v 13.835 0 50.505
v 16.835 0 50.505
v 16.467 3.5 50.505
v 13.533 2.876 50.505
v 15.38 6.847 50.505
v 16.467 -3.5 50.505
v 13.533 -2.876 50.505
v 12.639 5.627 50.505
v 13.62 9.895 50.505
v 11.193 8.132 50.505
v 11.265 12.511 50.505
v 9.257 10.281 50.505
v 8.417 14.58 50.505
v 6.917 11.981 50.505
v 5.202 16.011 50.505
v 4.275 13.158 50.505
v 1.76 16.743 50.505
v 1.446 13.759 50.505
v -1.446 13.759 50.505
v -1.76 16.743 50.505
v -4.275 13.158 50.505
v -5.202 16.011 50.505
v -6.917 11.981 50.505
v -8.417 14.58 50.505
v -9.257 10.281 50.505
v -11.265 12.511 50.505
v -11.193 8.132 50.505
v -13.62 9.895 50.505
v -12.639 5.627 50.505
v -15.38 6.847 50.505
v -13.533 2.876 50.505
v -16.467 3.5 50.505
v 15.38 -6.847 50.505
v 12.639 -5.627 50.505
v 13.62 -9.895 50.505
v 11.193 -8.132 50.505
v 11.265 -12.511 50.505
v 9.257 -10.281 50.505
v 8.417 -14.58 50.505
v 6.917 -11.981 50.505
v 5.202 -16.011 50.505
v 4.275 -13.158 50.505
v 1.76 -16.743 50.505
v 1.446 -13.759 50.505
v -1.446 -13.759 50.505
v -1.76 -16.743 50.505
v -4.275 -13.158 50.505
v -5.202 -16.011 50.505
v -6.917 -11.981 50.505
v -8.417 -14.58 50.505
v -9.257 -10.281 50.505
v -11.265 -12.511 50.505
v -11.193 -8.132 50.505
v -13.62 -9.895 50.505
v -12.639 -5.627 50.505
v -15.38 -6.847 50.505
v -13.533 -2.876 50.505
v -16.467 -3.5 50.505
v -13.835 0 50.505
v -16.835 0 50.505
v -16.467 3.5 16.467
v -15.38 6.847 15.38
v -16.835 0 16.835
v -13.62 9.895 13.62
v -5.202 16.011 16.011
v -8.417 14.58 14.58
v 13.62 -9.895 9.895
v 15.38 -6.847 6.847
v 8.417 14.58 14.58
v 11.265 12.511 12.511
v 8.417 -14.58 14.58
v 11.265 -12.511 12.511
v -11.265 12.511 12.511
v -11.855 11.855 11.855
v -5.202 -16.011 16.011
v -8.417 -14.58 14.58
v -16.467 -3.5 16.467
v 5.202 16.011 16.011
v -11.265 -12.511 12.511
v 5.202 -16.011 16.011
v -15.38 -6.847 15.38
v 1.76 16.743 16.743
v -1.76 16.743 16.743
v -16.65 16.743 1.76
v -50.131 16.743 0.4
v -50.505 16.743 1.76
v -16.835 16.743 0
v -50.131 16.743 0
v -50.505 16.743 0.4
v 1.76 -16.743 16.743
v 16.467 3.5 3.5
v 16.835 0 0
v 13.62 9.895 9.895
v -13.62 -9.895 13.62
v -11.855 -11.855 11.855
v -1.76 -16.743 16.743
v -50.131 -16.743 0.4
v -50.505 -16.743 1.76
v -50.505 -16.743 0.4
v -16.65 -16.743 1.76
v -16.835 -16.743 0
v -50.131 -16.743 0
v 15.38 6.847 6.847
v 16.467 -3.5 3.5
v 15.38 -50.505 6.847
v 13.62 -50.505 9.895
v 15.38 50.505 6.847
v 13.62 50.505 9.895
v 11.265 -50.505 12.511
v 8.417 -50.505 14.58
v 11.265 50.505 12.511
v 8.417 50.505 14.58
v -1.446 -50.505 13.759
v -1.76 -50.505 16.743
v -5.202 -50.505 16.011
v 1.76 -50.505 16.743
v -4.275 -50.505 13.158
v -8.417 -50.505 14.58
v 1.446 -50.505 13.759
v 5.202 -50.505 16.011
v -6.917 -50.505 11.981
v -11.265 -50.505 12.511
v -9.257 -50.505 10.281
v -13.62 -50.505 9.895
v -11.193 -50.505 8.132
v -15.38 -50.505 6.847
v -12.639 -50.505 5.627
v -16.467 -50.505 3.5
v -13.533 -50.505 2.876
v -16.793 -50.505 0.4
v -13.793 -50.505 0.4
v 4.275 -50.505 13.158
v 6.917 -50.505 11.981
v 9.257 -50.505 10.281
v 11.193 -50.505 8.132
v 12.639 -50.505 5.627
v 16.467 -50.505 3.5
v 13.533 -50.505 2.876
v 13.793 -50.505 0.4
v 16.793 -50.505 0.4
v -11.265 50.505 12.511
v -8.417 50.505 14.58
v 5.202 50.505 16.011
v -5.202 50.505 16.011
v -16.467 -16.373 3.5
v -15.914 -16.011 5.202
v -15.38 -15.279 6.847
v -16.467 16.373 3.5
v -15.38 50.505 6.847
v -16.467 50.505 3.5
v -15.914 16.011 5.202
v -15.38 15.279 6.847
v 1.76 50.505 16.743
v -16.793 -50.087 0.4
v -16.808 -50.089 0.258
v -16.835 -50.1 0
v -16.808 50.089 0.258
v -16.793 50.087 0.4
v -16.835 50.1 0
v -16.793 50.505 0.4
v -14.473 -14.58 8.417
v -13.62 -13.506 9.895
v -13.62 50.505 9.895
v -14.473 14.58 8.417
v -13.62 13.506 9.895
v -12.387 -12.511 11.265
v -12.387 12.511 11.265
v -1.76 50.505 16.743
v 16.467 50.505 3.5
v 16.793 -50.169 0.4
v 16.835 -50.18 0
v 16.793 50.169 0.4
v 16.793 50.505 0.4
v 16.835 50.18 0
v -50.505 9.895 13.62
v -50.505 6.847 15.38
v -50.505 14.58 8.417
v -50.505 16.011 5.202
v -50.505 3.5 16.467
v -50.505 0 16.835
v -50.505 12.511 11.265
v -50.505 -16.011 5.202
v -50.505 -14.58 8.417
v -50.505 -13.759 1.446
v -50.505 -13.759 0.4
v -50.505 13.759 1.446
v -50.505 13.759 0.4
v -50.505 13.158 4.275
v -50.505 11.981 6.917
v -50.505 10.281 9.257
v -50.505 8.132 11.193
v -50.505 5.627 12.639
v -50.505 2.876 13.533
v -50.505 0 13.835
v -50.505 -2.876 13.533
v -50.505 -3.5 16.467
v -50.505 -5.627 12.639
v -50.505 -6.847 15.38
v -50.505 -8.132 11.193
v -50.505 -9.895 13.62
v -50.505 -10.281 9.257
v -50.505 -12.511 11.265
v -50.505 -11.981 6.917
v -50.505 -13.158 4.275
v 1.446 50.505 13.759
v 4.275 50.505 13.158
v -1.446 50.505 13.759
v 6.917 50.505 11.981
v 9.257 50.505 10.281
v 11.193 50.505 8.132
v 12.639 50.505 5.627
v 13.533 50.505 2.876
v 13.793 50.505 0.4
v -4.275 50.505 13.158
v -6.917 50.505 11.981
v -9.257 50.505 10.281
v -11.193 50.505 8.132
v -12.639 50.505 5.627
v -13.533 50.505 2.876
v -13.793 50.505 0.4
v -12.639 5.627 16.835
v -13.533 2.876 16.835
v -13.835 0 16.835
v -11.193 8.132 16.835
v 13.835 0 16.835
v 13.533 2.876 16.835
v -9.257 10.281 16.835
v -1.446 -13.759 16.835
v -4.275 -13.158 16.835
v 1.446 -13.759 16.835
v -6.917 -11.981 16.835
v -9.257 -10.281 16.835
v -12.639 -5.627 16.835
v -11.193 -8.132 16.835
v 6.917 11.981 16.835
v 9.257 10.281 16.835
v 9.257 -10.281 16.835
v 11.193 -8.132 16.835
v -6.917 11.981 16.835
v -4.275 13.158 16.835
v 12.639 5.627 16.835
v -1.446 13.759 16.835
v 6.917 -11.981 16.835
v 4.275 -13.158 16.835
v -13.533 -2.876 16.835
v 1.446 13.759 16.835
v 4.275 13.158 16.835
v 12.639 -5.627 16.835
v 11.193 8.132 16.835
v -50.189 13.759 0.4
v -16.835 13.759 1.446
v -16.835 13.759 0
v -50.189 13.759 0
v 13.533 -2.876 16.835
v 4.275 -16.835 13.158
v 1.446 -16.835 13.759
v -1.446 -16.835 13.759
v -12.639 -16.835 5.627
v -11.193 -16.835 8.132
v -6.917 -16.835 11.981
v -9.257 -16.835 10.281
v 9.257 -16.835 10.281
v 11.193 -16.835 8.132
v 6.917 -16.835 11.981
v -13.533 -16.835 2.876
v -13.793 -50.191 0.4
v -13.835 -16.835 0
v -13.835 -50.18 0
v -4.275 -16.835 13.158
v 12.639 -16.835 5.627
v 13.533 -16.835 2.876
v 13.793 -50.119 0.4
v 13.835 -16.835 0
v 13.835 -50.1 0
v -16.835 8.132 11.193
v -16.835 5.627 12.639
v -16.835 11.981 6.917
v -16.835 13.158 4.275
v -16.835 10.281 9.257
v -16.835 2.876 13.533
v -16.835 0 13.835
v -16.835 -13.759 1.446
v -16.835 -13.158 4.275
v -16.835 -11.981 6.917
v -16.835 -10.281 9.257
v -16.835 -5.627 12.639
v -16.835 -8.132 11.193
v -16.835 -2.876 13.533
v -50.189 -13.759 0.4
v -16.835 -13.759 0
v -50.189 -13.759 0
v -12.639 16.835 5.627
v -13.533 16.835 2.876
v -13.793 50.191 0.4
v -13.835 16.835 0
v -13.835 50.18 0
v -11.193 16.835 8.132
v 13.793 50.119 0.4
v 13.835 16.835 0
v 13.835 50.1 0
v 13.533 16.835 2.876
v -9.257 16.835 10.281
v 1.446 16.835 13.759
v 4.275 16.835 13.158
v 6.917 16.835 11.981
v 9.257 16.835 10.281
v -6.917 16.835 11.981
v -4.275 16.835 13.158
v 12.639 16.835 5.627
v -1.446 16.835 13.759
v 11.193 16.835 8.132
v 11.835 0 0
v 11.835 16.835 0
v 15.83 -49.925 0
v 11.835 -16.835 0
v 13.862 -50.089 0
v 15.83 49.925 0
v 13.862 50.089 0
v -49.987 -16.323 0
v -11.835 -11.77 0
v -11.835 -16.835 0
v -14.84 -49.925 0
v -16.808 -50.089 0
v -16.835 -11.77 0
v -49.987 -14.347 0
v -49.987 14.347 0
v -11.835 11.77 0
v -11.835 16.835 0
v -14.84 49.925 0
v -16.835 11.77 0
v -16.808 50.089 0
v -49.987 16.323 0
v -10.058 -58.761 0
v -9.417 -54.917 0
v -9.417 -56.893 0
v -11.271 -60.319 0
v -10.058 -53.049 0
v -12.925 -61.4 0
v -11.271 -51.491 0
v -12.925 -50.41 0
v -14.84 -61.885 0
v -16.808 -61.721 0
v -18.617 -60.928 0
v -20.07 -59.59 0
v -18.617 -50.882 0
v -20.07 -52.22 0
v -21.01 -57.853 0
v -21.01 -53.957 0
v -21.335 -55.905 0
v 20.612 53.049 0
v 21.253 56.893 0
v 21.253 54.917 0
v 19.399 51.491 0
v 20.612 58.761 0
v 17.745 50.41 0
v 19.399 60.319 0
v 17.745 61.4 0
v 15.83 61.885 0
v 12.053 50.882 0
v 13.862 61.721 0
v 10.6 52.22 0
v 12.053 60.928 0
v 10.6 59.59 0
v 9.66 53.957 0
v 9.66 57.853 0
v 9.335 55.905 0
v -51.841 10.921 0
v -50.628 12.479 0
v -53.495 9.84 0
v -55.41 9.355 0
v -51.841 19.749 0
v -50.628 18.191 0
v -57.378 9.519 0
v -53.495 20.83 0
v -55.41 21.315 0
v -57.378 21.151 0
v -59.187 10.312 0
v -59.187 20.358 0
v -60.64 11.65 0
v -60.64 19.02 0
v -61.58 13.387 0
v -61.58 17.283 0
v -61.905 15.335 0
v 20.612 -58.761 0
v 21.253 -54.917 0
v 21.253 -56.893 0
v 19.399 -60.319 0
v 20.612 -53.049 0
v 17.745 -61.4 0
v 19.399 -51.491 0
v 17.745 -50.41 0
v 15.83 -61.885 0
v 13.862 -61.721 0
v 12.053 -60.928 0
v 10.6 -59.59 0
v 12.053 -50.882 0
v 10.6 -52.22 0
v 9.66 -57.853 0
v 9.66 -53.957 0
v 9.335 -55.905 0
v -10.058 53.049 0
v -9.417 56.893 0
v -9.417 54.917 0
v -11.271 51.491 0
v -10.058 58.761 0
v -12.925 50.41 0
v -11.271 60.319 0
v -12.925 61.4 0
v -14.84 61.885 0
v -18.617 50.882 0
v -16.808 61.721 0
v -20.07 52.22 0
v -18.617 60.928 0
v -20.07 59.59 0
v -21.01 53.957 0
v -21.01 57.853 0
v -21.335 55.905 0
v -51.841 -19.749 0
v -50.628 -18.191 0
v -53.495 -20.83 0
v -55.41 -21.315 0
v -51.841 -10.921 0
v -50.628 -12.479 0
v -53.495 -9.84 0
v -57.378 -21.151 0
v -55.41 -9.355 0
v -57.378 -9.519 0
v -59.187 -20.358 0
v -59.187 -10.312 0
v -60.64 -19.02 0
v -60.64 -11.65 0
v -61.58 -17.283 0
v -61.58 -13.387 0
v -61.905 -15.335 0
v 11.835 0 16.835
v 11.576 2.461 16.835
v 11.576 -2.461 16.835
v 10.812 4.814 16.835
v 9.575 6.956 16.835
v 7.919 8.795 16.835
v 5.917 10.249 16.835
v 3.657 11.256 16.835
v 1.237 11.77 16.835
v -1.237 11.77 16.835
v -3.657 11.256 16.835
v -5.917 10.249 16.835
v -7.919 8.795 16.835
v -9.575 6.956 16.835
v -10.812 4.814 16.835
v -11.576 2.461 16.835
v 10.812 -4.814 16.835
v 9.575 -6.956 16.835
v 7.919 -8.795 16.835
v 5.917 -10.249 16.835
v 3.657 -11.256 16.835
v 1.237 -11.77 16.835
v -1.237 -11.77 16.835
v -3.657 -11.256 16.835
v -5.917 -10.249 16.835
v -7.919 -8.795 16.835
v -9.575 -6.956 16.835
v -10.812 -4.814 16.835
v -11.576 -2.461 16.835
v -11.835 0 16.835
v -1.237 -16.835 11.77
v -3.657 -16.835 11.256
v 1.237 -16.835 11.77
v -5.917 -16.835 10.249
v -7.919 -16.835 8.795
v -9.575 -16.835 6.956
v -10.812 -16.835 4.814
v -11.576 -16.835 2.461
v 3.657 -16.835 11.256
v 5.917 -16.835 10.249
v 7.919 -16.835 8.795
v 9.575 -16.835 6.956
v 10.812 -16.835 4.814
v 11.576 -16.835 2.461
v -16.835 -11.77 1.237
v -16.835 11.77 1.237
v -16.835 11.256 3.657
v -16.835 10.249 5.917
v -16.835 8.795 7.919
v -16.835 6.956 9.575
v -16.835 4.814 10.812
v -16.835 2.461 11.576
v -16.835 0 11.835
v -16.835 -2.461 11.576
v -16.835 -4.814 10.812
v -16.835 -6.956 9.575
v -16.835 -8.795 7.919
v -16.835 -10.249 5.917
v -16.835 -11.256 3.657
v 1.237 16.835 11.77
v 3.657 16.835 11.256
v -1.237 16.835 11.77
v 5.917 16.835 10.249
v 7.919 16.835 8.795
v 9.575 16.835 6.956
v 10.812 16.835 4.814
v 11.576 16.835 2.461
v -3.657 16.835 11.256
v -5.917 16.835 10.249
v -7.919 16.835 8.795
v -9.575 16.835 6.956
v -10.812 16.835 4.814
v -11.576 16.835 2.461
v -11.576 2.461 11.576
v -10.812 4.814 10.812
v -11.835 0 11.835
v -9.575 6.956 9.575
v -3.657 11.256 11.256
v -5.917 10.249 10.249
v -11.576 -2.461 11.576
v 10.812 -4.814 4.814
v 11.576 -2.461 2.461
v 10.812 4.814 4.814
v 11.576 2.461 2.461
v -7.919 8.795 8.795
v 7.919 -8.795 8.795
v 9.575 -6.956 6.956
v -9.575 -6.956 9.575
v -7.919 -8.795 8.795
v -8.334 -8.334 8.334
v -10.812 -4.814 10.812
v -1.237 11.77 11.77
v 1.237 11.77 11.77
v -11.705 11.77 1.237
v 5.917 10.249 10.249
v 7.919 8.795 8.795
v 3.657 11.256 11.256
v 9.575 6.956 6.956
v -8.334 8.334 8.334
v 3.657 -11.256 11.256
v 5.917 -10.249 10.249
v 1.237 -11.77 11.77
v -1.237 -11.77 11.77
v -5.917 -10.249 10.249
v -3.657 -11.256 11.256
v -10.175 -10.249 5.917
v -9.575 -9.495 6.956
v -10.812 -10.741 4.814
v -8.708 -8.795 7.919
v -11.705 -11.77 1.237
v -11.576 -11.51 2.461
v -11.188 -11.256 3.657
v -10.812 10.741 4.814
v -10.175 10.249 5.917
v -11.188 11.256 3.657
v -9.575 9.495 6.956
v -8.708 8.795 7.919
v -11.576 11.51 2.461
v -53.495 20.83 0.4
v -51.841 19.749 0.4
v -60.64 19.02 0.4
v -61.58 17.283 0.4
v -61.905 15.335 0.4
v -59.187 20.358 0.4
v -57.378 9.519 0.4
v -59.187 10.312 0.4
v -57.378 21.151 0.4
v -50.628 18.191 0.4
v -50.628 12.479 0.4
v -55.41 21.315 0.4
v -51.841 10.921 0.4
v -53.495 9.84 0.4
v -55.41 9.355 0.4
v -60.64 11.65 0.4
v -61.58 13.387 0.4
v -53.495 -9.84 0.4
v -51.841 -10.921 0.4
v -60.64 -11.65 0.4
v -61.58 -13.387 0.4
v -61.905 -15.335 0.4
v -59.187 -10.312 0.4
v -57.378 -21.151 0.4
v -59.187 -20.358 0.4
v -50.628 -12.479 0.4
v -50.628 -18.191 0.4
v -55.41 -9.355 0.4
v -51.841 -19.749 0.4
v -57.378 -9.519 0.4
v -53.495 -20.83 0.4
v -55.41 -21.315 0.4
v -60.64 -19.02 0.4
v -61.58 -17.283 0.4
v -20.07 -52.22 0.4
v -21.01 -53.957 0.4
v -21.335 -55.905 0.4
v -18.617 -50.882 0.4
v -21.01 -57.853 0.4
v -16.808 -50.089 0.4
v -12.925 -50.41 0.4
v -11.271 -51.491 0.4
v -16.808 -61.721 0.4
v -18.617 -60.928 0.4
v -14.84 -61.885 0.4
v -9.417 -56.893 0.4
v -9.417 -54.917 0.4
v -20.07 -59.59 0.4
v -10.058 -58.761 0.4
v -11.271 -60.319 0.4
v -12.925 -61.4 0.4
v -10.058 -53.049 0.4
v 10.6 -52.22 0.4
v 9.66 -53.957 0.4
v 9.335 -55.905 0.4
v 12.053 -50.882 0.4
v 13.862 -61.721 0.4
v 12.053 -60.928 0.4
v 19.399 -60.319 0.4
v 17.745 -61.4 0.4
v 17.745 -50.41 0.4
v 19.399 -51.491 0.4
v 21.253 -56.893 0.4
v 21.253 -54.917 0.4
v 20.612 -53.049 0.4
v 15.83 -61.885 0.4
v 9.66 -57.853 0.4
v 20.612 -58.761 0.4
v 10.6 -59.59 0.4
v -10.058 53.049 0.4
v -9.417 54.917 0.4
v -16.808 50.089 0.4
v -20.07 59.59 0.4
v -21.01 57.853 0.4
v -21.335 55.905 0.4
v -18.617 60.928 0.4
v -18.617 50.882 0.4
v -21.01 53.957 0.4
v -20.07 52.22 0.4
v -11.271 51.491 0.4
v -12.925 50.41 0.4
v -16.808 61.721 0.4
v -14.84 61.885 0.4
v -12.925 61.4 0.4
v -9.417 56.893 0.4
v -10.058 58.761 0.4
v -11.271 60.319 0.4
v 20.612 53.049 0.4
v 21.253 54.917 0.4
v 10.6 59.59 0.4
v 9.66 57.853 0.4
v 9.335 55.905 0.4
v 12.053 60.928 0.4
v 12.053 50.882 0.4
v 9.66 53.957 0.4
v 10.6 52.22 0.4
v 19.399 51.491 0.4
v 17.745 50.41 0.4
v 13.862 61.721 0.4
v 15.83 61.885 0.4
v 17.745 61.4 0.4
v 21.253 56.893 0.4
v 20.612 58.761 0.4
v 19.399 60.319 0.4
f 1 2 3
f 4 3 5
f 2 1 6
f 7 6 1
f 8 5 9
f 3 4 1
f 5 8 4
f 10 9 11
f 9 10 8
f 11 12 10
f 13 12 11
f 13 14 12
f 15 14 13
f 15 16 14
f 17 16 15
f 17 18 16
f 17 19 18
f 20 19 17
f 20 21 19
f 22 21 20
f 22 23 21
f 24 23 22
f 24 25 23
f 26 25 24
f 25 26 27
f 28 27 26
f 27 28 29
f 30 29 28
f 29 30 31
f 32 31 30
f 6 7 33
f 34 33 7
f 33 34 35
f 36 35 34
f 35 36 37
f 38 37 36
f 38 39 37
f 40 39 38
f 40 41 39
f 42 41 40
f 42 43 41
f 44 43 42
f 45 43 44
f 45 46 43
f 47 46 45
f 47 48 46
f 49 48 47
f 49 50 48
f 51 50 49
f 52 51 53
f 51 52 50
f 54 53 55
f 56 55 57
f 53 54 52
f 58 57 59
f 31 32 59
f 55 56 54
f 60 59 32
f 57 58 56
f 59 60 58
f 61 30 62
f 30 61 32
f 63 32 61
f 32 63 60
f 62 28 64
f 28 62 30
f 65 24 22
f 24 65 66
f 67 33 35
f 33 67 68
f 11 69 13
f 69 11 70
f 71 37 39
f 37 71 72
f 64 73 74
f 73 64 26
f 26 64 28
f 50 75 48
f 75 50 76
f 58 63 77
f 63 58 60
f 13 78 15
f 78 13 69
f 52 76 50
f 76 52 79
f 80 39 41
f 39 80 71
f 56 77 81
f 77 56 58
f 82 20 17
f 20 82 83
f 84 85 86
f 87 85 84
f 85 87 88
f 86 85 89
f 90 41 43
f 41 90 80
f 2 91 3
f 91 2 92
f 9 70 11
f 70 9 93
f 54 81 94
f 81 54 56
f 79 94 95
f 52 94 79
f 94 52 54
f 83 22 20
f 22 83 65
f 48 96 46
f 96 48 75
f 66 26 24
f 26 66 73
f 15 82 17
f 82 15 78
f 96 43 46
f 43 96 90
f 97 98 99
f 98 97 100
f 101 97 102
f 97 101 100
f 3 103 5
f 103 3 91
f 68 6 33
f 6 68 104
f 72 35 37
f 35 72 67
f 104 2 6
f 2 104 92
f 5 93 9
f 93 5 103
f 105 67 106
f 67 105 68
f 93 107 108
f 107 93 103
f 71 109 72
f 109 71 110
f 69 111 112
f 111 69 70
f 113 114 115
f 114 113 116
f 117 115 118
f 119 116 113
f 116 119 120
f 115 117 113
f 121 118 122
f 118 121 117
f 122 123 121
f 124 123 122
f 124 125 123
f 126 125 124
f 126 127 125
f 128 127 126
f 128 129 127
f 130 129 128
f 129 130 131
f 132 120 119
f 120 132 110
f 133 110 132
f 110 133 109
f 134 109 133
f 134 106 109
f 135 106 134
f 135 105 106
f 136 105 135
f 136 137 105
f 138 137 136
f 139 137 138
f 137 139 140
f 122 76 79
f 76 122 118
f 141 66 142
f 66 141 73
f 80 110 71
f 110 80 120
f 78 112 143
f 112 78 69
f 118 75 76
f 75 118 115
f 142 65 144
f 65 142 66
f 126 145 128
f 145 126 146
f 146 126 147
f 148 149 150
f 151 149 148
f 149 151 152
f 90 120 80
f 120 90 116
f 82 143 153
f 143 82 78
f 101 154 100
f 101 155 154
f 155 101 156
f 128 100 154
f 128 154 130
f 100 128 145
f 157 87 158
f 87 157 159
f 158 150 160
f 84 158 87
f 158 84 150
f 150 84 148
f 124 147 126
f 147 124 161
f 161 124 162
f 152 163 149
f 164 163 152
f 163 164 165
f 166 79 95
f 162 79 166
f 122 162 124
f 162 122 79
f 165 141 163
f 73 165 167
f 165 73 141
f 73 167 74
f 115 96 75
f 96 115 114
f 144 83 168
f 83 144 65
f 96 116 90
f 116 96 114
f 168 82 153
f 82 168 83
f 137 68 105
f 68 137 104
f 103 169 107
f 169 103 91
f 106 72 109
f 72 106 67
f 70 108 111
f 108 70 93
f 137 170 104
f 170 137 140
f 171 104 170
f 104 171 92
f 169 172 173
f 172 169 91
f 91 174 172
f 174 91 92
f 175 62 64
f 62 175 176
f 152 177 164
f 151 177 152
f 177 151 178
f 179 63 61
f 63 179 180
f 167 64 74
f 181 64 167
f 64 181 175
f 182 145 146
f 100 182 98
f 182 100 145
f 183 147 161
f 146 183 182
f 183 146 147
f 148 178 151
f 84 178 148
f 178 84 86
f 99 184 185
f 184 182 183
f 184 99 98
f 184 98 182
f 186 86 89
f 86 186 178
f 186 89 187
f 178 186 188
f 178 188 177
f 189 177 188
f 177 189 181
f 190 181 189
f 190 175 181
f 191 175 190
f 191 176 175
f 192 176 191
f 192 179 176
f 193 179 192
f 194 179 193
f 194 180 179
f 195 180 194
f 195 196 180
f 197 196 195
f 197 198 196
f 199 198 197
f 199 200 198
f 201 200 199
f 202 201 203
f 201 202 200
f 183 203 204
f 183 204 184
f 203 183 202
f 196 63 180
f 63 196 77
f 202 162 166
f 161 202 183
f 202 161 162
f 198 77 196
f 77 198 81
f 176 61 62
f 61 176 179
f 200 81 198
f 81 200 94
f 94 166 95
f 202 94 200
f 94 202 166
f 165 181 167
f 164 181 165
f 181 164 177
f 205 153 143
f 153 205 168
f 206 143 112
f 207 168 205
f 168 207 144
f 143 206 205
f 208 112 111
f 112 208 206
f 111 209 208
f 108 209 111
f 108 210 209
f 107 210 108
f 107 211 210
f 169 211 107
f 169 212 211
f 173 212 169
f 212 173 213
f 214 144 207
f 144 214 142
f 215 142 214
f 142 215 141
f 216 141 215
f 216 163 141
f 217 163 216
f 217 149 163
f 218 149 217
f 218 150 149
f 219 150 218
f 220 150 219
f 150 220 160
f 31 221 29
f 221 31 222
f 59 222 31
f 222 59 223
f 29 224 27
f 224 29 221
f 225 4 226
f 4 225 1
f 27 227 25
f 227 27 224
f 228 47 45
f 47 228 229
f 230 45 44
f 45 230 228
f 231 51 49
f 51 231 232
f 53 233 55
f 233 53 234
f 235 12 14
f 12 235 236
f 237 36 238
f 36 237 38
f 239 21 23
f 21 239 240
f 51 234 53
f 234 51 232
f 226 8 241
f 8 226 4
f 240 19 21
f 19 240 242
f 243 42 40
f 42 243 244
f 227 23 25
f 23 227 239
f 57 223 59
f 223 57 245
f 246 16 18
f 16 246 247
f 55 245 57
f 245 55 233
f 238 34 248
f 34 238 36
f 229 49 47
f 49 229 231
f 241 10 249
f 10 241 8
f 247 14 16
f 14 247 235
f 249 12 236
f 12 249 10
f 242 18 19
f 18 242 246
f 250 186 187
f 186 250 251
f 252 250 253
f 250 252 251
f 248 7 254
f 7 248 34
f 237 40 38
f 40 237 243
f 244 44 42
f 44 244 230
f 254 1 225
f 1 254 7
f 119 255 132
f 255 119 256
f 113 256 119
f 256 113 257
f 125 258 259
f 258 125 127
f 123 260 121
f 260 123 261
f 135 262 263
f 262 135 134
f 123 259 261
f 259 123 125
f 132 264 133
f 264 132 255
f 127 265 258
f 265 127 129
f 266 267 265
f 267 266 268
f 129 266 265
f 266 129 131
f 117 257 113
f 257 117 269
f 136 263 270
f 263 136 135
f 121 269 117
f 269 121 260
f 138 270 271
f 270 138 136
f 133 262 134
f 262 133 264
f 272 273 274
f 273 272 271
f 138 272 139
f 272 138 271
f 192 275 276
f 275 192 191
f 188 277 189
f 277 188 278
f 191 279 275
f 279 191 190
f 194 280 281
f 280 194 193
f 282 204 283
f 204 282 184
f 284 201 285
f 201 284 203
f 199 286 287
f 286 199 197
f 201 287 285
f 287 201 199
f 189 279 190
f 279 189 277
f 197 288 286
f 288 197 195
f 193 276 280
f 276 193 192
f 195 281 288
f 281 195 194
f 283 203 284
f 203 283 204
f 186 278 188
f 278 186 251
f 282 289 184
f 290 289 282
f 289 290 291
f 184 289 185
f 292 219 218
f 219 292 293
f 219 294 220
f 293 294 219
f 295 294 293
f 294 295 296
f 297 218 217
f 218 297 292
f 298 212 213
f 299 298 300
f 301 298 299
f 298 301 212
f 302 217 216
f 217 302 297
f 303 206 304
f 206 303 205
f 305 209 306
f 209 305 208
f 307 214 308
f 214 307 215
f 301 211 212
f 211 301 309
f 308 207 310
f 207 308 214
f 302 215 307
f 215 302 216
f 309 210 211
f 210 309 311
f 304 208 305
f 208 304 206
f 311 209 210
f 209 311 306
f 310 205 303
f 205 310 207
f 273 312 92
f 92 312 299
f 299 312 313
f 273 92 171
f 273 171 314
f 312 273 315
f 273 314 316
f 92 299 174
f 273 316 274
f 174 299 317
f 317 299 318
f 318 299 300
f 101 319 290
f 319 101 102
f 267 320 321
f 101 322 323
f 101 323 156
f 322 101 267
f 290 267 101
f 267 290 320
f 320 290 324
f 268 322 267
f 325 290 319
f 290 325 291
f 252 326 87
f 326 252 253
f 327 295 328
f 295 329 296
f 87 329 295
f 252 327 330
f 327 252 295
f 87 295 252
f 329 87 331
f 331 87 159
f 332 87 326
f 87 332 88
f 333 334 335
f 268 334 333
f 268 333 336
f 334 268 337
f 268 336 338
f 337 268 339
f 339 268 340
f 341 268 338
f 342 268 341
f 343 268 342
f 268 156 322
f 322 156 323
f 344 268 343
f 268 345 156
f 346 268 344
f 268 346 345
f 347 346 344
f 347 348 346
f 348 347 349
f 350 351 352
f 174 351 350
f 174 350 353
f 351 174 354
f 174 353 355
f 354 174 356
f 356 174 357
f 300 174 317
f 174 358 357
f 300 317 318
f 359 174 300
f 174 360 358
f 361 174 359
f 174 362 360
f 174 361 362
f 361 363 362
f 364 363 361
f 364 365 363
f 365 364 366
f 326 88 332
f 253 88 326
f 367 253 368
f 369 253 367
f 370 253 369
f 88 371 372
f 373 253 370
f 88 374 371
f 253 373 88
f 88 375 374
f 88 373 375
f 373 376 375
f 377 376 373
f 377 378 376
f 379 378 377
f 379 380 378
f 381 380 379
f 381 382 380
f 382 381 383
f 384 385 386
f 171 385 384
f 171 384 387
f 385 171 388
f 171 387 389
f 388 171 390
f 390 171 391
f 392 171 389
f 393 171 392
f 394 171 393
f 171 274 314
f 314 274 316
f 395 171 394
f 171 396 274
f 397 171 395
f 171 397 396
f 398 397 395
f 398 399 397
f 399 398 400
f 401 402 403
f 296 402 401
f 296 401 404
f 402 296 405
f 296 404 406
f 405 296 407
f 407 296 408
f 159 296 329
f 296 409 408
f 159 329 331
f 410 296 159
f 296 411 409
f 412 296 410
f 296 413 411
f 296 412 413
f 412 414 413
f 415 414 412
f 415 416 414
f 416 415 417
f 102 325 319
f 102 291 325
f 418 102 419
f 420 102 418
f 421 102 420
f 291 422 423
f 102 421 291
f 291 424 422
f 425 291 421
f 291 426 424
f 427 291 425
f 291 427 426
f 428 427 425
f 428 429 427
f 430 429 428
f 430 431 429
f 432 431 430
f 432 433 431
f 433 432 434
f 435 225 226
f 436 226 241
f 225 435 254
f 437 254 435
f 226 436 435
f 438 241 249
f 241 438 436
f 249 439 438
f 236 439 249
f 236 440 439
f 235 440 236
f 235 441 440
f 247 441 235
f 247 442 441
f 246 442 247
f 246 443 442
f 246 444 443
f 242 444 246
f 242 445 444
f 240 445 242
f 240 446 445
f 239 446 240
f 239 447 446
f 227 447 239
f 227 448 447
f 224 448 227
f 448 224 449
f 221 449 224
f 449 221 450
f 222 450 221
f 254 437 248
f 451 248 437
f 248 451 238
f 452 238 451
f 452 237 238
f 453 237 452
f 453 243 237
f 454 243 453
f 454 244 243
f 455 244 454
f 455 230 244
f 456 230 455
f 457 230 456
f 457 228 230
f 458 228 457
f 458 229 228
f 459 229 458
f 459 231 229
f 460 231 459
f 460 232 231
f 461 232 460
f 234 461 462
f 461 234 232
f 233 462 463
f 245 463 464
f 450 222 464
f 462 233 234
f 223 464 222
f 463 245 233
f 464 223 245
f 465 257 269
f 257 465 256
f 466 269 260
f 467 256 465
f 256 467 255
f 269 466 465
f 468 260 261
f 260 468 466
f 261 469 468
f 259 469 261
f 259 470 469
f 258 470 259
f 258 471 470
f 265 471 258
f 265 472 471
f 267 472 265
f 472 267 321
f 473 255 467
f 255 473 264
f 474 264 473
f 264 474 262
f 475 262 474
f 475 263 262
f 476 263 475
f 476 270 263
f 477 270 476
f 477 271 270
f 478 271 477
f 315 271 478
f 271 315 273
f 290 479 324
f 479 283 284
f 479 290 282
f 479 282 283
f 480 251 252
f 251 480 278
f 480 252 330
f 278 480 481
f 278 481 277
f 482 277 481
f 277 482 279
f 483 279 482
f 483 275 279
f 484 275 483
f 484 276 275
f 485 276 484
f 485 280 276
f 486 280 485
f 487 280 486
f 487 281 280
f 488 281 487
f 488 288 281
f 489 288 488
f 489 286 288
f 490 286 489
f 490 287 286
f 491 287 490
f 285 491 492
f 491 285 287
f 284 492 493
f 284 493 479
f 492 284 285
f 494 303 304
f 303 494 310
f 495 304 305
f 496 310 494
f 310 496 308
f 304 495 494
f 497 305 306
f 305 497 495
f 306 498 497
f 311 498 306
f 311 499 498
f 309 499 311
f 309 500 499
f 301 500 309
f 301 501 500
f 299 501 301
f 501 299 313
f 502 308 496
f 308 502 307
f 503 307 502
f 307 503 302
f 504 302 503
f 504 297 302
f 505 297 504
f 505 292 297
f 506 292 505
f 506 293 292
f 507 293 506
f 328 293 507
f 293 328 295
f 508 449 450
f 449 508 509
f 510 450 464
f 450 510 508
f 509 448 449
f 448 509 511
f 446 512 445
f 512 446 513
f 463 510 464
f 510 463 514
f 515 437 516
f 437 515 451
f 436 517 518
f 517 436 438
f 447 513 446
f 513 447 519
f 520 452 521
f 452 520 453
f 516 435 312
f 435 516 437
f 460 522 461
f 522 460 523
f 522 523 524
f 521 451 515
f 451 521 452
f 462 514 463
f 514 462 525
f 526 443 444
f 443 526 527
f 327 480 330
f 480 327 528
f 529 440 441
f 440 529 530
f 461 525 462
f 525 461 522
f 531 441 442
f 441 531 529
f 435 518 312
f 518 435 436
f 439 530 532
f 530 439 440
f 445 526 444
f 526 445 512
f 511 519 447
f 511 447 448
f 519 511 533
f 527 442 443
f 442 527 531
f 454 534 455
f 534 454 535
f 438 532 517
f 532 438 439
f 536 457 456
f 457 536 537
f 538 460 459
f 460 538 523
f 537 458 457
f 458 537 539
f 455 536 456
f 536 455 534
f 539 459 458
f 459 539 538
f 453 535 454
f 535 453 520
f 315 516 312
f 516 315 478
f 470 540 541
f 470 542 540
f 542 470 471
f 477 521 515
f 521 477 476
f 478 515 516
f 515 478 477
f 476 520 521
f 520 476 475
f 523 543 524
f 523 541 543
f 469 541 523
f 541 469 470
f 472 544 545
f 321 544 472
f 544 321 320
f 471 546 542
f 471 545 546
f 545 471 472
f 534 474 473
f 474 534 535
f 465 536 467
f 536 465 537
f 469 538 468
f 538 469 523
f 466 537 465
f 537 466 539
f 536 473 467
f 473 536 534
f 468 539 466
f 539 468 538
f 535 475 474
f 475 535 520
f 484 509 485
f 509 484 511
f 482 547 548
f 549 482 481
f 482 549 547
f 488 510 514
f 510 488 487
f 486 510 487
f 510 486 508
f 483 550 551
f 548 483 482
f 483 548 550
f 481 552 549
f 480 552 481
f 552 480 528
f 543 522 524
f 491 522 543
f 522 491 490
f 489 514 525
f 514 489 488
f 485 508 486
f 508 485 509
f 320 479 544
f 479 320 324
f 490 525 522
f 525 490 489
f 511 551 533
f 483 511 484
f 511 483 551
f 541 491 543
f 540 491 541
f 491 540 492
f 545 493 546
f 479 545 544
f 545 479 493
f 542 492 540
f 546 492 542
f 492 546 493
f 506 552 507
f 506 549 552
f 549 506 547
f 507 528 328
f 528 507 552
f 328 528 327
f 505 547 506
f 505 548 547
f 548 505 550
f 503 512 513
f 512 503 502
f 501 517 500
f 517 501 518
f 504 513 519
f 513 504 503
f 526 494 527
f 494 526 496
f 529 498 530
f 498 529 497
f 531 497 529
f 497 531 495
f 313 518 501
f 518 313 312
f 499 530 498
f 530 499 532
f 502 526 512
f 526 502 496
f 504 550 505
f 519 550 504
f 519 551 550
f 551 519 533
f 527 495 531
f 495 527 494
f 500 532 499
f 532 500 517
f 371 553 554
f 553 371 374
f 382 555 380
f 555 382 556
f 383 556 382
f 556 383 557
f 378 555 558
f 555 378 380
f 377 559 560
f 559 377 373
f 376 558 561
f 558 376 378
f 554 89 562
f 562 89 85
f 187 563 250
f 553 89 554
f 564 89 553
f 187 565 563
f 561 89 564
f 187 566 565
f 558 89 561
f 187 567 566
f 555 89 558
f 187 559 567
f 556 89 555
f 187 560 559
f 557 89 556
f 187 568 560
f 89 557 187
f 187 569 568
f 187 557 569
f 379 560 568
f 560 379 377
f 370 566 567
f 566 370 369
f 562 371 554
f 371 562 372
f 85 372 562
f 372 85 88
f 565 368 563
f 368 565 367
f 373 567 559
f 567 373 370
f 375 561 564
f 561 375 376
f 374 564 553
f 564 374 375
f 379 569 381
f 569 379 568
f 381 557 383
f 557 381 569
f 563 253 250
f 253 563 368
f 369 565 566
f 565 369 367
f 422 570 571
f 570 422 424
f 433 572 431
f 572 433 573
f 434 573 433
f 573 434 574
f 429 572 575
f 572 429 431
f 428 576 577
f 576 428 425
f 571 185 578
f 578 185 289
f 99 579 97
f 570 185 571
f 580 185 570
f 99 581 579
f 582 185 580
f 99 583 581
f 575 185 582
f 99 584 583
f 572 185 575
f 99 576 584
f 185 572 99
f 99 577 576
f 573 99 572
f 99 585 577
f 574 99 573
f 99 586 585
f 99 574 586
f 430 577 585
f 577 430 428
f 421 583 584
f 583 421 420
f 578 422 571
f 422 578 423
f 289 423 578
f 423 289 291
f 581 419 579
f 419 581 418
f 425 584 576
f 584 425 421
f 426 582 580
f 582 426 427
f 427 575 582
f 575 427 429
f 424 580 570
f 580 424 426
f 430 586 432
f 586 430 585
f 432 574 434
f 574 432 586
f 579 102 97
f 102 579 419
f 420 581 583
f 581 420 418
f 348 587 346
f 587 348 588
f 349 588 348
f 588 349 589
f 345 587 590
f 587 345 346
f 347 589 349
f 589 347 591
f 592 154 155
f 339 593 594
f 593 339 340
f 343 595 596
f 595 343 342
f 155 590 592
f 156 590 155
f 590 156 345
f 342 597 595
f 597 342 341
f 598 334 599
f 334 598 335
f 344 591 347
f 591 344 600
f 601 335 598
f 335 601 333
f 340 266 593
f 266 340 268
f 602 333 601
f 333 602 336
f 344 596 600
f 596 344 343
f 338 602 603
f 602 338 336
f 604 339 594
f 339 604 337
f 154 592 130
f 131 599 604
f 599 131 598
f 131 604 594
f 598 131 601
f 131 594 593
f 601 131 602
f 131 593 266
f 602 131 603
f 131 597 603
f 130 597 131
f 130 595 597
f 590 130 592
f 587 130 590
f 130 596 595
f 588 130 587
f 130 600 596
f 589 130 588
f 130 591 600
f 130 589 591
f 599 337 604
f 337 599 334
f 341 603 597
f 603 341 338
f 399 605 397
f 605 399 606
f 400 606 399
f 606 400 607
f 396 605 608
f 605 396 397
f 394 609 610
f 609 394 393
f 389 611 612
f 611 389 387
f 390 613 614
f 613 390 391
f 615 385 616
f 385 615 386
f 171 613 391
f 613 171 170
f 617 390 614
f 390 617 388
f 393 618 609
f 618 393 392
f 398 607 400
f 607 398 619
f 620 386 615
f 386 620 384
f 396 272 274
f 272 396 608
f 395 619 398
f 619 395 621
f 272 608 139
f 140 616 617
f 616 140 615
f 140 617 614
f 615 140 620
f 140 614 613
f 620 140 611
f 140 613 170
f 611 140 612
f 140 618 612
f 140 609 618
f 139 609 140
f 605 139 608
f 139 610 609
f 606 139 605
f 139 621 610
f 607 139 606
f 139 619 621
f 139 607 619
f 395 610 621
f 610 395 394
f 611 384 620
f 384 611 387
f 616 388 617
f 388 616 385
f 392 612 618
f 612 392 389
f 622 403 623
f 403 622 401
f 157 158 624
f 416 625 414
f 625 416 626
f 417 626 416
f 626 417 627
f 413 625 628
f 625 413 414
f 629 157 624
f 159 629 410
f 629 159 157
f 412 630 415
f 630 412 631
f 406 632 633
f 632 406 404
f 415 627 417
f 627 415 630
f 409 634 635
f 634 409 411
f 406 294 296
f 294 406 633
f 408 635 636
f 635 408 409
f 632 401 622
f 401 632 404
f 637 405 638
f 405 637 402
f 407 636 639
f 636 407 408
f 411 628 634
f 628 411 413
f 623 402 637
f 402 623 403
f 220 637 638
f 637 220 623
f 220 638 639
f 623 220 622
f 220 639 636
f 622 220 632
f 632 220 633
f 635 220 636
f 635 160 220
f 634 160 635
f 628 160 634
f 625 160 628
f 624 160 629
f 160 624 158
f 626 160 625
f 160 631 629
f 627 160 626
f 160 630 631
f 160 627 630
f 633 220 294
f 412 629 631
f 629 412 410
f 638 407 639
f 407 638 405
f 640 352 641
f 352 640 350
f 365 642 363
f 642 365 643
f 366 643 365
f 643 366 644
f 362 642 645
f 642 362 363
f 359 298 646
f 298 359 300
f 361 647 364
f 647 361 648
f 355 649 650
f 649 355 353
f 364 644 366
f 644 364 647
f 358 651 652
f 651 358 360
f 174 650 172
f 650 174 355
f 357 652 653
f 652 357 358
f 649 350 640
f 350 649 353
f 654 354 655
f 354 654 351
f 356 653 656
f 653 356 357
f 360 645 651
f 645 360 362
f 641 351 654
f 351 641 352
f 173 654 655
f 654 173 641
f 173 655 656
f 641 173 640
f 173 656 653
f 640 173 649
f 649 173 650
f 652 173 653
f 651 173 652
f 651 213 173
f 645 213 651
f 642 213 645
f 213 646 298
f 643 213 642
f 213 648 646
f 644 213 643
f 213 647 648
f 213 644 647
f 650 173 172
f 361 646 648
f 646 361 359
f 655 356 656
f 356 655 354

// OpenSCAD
// 5-way right angle pipe outer coupler (half)
// http://www.thingiverse.com/thing:27648
// 29 July 2012
// cbonsig
//

module pvc_coupler()
{
	pipe_od = 26.67; // outer diameter of the pipe. 3/4" SCH 40 = 1.050 in = 26.67 mm
	gap = 1.0; // clearance between pipe OD and coupler ID. Slip fit in this case
	ledge = 2.0; // size of the ledge that stops the pipe from sliding through
	wall = 3.0; // wall thickness of the coupler

	pad_w = 0.4; // wall thickness of anti-warping pads (0 for none)
	pad_r = 6.0; //radius of anti-warping pads
	
	inner = pipe_od + gap;
	outer = inner + (wall*2);

	od_r = r_from_dia(outer);
	cy_h = r_from_dia(outer * 3.0); // total length = 3x diameter

	id_r = od_r - wall;

	function r_from_dia(d) = d / 2;

	module rotcy(rot, r, h) {
		rotate(90, rot)
			cylinder(r = r, h = h, center = false);
	}

	
	// rotates the flat side of the half coupler to face down

	rotate(a=[0,180,0])
	{
		// join a large and small structure to form the coupler.
		// the small one forms the ledge in the middle to prevent
		// the coupler from freely sliding down the pipe
		
		union() {

			// large one: the main body of the coupler

			difference() {
				union() {
					cylinder(r = od_r, h = cy_h*2, center = true);
					rotcy([1,0,0], od_r, cy_h);
					rotcy([0,1,0], od_r, cy_h);
					rotcy([-1,0,0], od_r, cy_h); 
				}
					cylinder(r = id_r, h = (cy_h*2+1), center = true);
					rotcy([1,0,0], id_r, (cy_h+1));
					rotcy([0,1,0], id_r, (cy_h+1));
					rotcy([-1,0,0], id_r, (cy_h+1));
					
					// chop off one half for easy printing
					cylinder(r = 100, h = 100, center = false);
			}
	
			// smaller one: in middle to form a ledge

			difference() {

				union() {
					// single vertical portion of coupler (Z)
					cylinder(r = (od_r-ledge), h = (od_r*2), center = true);

					// two horizontal portions of the coupler (X, Y)
					rotcy([1,0,0], (od_r-ledge), (od_r));
					rotcy([0,1,0], (od_r-ledge), (od_r));
					rotcy([-1,0,0], (od_r-ledge), (od_r));
				}
					// now subtract the same structure, but smaller
					cylinder(r = (id_r-ledge), h = ((od_r*2)+1), center = true);
					rotcy([1,0,0], (id_r-ledge), ((od_r)+1));
					rotcy([0,1,0], (id_r-ledge), ((od_r)+1));
					rotcy([-1,0,0], (id_r-ledge), (od_r)); 

					// chop off one half of the whole thing for easy printing
					cylinder(r = 100, h = 100, center = false);
			}
			
			// add some pads at the ends to help prevent warping

			translate(v = [(cy_h+pad_r*0.9),(od_r-(wall*0.5)),-pad_w]){
			cylinder(r = pad_r, h = pad_w, center = false);
			}

			translate(v = [(cy_h+pad_r*0.9),-(od_r-(wall*0.5)),-pad_w]){
			cylinder(r = pad_r, h = pad_w, center = false);
			}

			translate(v = [(od_r-(wall*0.5)),-(cy_h+pad_r*0.9),-pad_w]){
			cylinder(r = pad_r, h = pad_w, center = false);
			}

			translate(v = [-(od_r-(wall*0.5)),-(cy_h+pad_r*0.9),-pad_w]){
			cylinder(r = pad_r, h = pad_w, center = false);
			}

			translate(v = [(od_r-(wall*0.5)),(cy_h+pad_r*0.9),-pad_w]){
			cylinder(r = pad_r, h = pad_w, center = false);
			}

			translate(v = [-(od_r-(wall*0.5)),(cy_h+pad_r*0.9),-pad_w]){
			cylinder(r = pad_r, h = pad_w, center = false);
			}

			
		}
	}
}

pvc_coupler();
